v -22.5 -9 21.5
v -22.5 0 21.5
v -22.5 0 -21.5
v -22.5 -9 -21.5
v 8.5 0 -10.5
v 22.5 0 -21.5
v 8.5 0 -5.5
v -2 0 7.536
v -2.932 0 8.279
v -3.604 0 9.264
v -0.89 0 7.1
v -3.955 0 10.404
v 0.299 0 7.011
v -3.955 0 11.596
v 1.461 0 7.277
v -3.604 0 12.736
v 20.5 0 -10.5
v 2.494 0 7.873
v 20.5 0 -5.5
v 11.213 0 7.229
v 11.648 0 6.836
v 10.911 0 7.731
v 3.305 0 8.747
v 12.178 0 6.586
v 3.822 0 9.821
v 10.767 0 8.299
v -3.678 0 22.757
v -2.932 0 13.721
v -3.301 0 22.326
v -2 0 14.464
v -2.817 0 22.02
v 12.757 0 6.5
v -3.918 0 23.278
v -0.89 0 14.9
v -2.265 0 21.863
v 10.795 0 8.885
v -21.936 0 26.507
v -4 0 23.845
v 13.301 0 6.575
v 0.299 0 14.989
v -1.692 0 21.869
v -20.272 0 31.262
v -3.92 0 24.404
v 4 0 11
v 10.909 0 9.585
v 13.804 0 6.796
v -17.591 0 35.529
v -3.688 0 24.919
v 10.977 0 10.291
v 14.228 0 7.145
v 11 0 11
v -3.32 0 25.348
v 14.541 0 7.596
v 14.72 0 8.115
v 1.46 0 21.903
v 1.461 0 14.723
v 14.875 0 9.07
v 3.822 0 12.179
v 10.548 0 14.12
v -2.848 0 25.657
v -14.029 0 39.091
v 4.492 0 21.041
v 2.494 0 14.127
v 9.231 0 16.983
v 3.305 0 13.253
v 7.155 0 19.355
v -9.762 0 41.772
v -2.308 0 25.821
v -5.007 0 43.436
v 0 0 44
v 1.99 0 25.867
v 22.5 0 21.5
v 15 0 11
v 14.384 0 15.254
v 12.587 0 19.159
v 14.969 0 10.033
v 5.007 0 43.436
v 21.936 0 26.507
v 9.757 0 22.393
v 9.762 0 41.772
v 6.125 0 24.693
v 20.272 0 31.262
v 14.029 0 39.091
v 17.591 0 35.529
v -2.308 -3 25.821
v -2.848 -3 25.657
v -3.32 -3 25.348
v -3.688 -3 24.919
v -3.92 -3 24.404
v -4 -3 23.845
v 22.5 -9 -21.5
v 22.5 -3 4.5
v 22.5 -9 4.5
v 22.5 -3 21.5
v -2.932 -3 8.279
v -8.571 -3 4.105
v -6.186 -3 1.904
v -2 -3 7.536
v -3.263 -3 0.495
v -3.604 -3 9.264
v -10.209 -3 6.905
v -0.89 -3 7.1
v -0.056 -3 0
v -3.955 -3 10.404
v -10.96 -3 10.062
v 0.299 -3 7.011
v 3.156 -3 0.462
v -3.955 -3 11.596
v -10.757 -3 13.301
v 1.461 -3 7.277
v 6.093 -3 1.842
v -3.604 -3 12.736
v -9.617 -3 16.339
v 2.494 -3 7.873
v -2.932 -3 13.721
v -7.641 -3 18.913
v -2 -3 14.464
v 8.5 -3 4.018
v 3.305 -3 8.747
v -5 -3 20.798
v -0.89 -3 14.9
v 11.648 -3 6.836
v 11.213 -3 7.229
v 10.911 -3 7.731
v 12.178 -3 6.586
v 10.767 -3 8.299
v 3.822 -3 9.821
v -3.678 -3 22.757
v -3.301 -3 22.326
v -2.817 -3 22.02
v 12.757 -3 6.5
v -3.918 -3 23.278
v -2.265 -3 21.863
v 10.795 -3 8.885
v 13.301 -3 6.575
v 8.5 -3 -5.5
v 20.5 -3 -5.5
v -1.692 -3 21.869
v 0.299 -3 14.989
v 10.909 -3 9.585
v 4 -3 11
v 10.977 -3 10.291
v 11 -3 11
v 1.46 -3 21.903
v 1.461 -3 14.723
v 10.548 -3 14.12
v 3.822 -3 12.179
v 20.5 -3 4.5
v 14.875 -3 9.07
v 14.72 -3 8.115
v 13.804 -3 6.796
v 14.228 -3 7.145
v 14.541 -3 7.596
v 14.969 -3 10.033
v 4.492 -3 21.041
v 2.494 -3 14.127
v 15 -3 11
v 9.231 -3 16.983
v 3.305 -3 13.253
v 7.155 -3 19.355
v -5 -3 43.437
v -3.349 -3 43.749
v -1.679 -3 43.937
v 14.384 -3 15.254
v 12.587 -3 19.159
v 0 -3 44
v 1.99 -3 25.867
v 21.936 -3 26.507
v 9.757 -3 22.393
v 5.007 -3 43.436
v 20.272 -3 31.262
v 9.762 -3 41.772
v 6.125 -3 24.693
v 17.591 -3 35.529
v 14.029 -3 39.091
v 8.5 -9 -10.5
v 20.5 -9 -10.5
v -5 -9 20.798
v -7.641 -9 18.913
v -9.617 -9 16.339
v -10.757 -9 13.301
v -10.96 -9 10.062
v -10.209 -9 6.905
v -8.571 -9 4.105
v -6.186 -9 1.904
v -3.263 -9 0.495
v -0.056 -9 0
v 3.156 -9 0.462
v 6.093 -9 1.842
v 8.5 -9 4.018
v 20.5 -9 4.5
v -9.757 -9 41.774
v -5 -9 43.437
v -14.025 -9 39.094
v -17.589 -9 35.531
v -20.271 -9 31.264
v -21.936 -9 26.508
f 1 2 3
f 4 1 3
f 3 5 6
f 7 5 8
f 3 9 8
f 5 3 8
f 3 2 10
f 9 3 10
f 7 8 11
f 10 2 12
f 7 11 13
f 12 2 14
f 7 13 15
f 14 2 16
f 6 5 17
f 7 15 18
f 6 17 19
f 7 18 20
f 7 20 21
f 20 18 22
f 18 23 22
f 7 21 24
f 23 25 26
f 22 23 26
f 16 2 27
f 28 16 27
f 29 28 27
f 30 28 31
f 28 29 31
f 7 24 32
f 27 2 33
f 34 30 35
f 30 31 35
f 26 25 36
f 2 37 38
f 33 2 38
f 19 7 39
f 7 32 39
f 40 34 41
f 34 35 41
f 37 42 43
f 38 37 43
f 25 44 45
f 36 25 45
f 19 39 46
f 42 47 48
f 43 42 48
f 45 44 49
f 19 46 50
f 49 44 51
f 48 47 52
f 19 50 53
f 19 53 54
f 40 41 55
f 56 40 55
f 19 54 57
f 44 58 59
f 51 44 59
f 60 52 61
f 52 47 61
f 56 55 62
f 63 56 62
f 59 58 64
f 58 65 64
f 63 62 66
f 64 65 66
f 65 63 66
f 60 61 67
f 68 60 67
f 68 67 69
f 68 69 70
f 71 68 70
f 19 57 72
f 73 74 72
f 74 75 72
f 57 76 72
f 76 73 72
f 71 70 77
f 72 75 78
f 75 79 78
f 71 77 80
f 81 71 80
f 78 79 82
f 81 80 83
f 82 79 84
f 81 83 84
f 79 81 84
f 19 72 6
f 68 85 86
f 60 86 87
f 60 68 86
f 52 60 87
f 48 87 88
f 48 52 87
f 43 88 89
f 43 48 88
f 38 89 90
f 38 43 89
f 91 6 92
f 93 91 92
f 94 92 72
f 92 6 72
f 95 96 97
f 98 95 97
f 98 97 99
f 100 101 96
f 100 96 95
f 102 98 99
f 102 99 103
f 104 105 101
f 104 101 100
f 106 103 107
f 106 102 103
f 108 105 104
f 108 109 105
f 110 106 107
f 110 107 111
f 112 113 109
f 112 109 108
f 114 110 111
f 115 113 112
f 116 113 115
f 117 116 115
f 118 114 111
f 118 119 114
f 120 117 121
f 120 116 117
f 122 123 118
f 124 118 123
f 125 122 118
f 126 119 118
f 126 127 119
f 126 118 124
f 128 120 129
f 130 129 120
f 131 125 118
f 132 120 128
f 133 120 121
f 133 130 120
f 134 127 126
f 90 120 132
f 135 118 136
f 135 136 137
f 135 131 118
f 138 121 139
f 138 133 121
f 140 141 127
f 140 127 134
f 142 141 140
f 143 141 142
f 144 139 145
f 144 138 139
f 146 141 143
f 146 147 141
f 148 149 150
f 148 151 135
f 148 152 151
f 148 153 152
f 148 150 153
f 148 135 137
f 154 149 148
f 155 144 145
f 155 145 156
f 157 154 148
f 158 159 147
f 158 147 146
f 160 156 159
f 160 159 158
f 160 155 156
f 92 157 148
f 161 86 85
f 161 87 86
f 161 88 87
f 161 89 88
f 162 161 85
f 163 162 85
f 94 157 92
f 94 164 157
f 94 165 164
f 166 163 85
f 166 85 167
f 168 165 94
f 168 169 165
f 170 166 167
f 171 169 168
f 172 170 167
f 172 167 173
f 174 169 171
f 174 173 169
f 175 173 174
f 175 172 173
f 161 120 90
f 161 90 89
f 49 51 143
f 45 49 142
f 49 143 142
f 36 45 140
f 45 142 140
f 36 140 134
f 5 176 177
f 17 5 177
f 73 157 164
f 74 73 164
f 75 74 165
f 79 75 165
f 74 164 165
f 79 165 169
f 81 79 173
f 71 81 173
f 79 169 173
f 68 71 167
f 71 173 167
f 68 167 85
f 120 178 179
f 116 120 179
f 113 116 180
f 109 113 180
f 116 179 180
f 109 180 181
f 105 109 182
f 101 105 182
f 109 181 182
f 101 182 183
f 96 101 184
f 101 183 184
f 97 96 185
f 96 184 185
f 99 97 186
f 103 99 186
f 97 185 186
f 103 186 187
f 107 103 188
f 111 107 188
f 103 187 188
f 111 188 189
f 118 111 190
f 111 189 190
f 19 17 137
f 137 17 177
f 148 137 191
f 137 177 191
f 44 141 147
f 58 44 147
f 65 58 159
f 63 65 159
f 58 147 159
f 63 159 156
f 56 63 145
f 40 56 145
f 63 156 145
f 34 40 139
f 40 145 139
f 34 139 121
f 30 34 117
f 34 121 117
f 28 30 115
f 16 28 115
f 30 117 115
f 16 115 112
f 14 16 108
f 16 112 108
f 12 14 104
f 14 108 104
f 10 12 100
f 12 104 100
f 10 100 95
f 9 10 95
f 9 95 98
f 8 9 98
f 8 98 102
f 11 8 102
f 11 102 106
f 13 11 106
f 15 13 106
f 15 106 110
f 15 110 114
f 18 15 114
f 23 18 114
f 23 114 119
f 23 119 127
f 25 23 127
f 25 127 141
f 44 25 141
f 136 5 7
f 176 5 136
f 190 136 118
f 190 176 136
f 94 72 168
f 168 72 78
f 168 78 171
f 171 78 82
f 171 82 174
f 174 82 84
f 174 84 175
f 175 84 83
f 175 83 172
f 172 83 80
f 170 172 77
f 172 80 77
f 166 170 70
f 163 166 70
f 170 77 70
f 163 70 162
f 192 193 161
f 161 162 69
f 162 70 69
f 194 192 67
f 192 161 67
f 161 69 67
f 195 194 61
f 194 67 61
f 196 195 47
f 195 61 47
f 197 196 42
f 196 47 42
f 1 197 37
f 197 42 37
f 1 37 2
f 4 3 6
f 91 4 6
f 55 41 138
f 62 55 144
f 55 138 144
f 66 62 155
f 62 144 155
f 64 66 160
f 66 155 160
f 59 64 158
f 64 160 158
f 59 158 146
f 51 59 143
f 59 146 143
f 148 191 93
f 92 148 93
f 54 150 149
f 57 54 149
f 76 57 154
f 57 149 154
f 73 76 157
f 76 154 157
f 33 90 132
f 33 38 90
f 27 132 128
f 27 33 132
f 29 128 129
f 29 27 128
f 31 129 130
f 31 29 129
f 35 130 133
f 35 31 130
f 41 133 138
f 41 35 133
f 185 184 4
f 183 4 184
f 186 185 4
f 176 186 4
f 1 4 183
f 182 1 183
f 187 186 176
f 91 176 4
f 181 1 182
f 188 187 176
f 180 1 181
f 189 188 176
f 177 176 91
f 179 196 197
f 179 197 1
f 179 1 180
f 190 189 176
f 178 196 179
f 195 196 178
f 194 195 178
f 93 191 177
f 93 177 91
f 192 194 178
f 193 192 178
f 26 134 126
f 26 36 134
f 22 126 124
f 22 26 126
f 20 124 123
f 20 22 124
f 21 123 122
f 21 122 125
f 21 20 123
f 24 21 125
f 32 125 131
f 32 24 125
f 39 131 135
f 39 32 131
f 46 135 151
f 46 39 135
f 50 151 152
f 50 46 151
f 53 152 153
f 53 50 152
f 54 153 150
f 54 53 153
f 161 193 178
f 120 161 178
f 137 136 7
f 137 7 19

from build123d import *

# Parameters (mm, degrees)
F1_DEPTH  = 9
F3_DEPTH  = 6
F4_R      = 4
F5_DEPTH  = 25
F6_R      = 1.99999
F7_W      = 12
F7_H      = 6
F8_DEPTH  = 15
F9_W      = 12
F9_H      = 5
F10_DEPTH = 25


# Not quite as in the source:
# - a fillet or chamfer is up to 0.001 mm smaller than in the source, because OpenCascade refuses the exact size


with BuildPart() as f1:
    # F0 (on Front) → F1 (new body)
    with BuildSketch(Plane.XZ):
        with BuildLine():
            ThreePointArc((0, 44), (-15.9099025767, 37.4099025767), (-22.5, 21.5))
            Line((-22.5, 21.5), (0, 21.5))
            Line((0, 21.5), (0, 44))
        make_face()
        with BuildLine():
            ThreePointArc((0, -1), (-15.9099025767, 5.5900974233), (-22.5, 21.5))
            Line((-22.5, 21.5), (-22.5, -21.5))
            Line((-22.5, -21.5), (0, -21.5))
            Line((0, -21.5), (0, -1))
        make_face()
        with BuildLine():
            Line((0, 21.5), (-22.5, 21.5))
            ThreePointArc((-22.5, 21.5), (-15.9099025767, 5.5900974233), (0, -1))
            Line((0, -1), (0, 21.5))
        make_face()
        with BuildLine():
            Line((0, 44), (0, 21.5))
            Line((0, 21.5), (22.5, 21.5))
            ThreePointArc((22.5, 21.5), (15.9099025767, 37.4099025767), (0, 44))
        make_face()
        with BuildLine():
            Line((22.5, 21.5), (0, 21.5))
            Line((0, 21.5), (0, -1))
            ThreePointArc((0, -1), (15.9099025767, 5.5900974233), (22.5, 21.5))
        make_face()
        with BuildLine():
            ThreePointArc((22.5, 21.5), (15.9099025767, 5.5900974233), (0, -1))
            Line((0, -1), (0, -21.5))
            Line((0, -21.5), (22.5, -21.5))
            Line((22.5, -21.5), (22.5, 21.5))
        make_face()
    extrude(amount=F1_DEPTH)

    # F2 (on face) → F3 (cut)
    with BuildSketch(Plane.XZ.offset(9)):
        with BuildLine():
            Line((0, 30.8210086077), (0, 44))
            ThreePointArc((0, 44), (-2.5157755473, 43.8589103803), (-5, 43.4374109685))
            Line((-5, 43.4374109685), (-5, 30.8210086077))
            Line((-5, 30.8210086077), (0, 30.8210086077))
        make_face()
        with BuildLine():
            Line((0, 22), (0, 30.8210086077))
            Line((0, 30.8210086077), (-5, 30.8210086077))
            Line((-5, 30.8210086077), (-5, 20.7979589711))
            ThreePointArc((-5, 20.7979589711), (-2.5712303784, 21.695268783), (0, 22))
        make_face()
        with BuildLine():
            ThreePointArc((11, 11), (7.7781745931, 18.7781745931), (0, 22))
            ThreePointArc((0, 22), (-2.5712303784, 21.695268783), (-5, 20.7979589711))
            ThreePointArc((-5, 20.7979589711), (-8.3760412767, 3.8696470964), (8.8741196746, 4.5))
            ThreePointArc((8.8741196746, 4.5), (10.4550302826, 7.5805933571), (11, 11))
        make_face()
        with BuildLine():
            ThreePointArc((22.5, 21.5), (15.9099025767, 37.4099025767), (0, 44))
            Line((0, 44), (0, 30.8210086077))
            Line((0, 30.8210086077), (0, 22))
            ThreePointArc((0, 22), (7.7781745931, 18.7781745931), (11, 11))
            ThreePointArc((11, 11), (10.4550302826, 7.5805933571), (8.8741196746, 4.5))
            Line((8.8741196746, 4.5), (22.5, 4.5))
            Line((22.5, 4.5), (22.5, 21.5))
        make_face()
    extrude(amount=-F3_DEPTH, mode=Mode.SUBTRACT)

    # F4 (on face) → F5 (cut)
    with BuildSketch(Plane.XZ.offset(3)):
        with BuildLine():
            ThreePointArc((-4, 21.246950766), (6.204836823, 20.0829510623), (11, 11))
            ThreePointArc((11, 11), (10.7566660599, 8.6991012027), (10.0374299499, 6.5))
            Line((10.0374299499, 6.5), (14.3090880213, 6.5))
            ThreePointArc((14.3090880213, 6.5), (14.8262658872, 8.7236345108), (15, 11))
            ThreePointArc((15, 11), (9.0829510623, 22.9373363863), (-4, 25.4568322948))
            Line((-4, 25.4568322948), (-4, 21.246950766))
        make_face()
        with Locations((0, 11)):
            Circle(F4_R)
    extrude(amount=-F5_DEPTH, mode=Mode.SUBTRACT)

    # F6 (radius 2 in the source; OpenCascade refuses exactly that, so slightly less here)
    f6_edges = [f1.edges().sort_by_distance(p)[0] for p in [
        (-4, -1.5, 25.456832),
        (-4, -1.5, 21.246951),
        (14.309088, -1.5, 6.5),
        (10.03743, -1.5, 6.5),
    ]]
    fillet(f6_edges, radius=F6_R)

    # F7 (on face) → F8 (cut)
    with BuildSketch(Plane.XY.offset(4.5)):
        with Locations((14.5, -6)):
            Rectangle(F7_W, F7_H)
    extrude(amount=-F8_DEPTH, mode=Mode.SUBTRACT)

    # F9 (on face) → F10 (cut)
    with BuildSketch(Plane.XZ.offset(3)):
        with Locations((14.5, -8)):
            Rectangle(F9_W, F9_H)
    extrude(amount=-F10_DEPTH, mode=Mode.SUBTRACT)


solid = f1.part
